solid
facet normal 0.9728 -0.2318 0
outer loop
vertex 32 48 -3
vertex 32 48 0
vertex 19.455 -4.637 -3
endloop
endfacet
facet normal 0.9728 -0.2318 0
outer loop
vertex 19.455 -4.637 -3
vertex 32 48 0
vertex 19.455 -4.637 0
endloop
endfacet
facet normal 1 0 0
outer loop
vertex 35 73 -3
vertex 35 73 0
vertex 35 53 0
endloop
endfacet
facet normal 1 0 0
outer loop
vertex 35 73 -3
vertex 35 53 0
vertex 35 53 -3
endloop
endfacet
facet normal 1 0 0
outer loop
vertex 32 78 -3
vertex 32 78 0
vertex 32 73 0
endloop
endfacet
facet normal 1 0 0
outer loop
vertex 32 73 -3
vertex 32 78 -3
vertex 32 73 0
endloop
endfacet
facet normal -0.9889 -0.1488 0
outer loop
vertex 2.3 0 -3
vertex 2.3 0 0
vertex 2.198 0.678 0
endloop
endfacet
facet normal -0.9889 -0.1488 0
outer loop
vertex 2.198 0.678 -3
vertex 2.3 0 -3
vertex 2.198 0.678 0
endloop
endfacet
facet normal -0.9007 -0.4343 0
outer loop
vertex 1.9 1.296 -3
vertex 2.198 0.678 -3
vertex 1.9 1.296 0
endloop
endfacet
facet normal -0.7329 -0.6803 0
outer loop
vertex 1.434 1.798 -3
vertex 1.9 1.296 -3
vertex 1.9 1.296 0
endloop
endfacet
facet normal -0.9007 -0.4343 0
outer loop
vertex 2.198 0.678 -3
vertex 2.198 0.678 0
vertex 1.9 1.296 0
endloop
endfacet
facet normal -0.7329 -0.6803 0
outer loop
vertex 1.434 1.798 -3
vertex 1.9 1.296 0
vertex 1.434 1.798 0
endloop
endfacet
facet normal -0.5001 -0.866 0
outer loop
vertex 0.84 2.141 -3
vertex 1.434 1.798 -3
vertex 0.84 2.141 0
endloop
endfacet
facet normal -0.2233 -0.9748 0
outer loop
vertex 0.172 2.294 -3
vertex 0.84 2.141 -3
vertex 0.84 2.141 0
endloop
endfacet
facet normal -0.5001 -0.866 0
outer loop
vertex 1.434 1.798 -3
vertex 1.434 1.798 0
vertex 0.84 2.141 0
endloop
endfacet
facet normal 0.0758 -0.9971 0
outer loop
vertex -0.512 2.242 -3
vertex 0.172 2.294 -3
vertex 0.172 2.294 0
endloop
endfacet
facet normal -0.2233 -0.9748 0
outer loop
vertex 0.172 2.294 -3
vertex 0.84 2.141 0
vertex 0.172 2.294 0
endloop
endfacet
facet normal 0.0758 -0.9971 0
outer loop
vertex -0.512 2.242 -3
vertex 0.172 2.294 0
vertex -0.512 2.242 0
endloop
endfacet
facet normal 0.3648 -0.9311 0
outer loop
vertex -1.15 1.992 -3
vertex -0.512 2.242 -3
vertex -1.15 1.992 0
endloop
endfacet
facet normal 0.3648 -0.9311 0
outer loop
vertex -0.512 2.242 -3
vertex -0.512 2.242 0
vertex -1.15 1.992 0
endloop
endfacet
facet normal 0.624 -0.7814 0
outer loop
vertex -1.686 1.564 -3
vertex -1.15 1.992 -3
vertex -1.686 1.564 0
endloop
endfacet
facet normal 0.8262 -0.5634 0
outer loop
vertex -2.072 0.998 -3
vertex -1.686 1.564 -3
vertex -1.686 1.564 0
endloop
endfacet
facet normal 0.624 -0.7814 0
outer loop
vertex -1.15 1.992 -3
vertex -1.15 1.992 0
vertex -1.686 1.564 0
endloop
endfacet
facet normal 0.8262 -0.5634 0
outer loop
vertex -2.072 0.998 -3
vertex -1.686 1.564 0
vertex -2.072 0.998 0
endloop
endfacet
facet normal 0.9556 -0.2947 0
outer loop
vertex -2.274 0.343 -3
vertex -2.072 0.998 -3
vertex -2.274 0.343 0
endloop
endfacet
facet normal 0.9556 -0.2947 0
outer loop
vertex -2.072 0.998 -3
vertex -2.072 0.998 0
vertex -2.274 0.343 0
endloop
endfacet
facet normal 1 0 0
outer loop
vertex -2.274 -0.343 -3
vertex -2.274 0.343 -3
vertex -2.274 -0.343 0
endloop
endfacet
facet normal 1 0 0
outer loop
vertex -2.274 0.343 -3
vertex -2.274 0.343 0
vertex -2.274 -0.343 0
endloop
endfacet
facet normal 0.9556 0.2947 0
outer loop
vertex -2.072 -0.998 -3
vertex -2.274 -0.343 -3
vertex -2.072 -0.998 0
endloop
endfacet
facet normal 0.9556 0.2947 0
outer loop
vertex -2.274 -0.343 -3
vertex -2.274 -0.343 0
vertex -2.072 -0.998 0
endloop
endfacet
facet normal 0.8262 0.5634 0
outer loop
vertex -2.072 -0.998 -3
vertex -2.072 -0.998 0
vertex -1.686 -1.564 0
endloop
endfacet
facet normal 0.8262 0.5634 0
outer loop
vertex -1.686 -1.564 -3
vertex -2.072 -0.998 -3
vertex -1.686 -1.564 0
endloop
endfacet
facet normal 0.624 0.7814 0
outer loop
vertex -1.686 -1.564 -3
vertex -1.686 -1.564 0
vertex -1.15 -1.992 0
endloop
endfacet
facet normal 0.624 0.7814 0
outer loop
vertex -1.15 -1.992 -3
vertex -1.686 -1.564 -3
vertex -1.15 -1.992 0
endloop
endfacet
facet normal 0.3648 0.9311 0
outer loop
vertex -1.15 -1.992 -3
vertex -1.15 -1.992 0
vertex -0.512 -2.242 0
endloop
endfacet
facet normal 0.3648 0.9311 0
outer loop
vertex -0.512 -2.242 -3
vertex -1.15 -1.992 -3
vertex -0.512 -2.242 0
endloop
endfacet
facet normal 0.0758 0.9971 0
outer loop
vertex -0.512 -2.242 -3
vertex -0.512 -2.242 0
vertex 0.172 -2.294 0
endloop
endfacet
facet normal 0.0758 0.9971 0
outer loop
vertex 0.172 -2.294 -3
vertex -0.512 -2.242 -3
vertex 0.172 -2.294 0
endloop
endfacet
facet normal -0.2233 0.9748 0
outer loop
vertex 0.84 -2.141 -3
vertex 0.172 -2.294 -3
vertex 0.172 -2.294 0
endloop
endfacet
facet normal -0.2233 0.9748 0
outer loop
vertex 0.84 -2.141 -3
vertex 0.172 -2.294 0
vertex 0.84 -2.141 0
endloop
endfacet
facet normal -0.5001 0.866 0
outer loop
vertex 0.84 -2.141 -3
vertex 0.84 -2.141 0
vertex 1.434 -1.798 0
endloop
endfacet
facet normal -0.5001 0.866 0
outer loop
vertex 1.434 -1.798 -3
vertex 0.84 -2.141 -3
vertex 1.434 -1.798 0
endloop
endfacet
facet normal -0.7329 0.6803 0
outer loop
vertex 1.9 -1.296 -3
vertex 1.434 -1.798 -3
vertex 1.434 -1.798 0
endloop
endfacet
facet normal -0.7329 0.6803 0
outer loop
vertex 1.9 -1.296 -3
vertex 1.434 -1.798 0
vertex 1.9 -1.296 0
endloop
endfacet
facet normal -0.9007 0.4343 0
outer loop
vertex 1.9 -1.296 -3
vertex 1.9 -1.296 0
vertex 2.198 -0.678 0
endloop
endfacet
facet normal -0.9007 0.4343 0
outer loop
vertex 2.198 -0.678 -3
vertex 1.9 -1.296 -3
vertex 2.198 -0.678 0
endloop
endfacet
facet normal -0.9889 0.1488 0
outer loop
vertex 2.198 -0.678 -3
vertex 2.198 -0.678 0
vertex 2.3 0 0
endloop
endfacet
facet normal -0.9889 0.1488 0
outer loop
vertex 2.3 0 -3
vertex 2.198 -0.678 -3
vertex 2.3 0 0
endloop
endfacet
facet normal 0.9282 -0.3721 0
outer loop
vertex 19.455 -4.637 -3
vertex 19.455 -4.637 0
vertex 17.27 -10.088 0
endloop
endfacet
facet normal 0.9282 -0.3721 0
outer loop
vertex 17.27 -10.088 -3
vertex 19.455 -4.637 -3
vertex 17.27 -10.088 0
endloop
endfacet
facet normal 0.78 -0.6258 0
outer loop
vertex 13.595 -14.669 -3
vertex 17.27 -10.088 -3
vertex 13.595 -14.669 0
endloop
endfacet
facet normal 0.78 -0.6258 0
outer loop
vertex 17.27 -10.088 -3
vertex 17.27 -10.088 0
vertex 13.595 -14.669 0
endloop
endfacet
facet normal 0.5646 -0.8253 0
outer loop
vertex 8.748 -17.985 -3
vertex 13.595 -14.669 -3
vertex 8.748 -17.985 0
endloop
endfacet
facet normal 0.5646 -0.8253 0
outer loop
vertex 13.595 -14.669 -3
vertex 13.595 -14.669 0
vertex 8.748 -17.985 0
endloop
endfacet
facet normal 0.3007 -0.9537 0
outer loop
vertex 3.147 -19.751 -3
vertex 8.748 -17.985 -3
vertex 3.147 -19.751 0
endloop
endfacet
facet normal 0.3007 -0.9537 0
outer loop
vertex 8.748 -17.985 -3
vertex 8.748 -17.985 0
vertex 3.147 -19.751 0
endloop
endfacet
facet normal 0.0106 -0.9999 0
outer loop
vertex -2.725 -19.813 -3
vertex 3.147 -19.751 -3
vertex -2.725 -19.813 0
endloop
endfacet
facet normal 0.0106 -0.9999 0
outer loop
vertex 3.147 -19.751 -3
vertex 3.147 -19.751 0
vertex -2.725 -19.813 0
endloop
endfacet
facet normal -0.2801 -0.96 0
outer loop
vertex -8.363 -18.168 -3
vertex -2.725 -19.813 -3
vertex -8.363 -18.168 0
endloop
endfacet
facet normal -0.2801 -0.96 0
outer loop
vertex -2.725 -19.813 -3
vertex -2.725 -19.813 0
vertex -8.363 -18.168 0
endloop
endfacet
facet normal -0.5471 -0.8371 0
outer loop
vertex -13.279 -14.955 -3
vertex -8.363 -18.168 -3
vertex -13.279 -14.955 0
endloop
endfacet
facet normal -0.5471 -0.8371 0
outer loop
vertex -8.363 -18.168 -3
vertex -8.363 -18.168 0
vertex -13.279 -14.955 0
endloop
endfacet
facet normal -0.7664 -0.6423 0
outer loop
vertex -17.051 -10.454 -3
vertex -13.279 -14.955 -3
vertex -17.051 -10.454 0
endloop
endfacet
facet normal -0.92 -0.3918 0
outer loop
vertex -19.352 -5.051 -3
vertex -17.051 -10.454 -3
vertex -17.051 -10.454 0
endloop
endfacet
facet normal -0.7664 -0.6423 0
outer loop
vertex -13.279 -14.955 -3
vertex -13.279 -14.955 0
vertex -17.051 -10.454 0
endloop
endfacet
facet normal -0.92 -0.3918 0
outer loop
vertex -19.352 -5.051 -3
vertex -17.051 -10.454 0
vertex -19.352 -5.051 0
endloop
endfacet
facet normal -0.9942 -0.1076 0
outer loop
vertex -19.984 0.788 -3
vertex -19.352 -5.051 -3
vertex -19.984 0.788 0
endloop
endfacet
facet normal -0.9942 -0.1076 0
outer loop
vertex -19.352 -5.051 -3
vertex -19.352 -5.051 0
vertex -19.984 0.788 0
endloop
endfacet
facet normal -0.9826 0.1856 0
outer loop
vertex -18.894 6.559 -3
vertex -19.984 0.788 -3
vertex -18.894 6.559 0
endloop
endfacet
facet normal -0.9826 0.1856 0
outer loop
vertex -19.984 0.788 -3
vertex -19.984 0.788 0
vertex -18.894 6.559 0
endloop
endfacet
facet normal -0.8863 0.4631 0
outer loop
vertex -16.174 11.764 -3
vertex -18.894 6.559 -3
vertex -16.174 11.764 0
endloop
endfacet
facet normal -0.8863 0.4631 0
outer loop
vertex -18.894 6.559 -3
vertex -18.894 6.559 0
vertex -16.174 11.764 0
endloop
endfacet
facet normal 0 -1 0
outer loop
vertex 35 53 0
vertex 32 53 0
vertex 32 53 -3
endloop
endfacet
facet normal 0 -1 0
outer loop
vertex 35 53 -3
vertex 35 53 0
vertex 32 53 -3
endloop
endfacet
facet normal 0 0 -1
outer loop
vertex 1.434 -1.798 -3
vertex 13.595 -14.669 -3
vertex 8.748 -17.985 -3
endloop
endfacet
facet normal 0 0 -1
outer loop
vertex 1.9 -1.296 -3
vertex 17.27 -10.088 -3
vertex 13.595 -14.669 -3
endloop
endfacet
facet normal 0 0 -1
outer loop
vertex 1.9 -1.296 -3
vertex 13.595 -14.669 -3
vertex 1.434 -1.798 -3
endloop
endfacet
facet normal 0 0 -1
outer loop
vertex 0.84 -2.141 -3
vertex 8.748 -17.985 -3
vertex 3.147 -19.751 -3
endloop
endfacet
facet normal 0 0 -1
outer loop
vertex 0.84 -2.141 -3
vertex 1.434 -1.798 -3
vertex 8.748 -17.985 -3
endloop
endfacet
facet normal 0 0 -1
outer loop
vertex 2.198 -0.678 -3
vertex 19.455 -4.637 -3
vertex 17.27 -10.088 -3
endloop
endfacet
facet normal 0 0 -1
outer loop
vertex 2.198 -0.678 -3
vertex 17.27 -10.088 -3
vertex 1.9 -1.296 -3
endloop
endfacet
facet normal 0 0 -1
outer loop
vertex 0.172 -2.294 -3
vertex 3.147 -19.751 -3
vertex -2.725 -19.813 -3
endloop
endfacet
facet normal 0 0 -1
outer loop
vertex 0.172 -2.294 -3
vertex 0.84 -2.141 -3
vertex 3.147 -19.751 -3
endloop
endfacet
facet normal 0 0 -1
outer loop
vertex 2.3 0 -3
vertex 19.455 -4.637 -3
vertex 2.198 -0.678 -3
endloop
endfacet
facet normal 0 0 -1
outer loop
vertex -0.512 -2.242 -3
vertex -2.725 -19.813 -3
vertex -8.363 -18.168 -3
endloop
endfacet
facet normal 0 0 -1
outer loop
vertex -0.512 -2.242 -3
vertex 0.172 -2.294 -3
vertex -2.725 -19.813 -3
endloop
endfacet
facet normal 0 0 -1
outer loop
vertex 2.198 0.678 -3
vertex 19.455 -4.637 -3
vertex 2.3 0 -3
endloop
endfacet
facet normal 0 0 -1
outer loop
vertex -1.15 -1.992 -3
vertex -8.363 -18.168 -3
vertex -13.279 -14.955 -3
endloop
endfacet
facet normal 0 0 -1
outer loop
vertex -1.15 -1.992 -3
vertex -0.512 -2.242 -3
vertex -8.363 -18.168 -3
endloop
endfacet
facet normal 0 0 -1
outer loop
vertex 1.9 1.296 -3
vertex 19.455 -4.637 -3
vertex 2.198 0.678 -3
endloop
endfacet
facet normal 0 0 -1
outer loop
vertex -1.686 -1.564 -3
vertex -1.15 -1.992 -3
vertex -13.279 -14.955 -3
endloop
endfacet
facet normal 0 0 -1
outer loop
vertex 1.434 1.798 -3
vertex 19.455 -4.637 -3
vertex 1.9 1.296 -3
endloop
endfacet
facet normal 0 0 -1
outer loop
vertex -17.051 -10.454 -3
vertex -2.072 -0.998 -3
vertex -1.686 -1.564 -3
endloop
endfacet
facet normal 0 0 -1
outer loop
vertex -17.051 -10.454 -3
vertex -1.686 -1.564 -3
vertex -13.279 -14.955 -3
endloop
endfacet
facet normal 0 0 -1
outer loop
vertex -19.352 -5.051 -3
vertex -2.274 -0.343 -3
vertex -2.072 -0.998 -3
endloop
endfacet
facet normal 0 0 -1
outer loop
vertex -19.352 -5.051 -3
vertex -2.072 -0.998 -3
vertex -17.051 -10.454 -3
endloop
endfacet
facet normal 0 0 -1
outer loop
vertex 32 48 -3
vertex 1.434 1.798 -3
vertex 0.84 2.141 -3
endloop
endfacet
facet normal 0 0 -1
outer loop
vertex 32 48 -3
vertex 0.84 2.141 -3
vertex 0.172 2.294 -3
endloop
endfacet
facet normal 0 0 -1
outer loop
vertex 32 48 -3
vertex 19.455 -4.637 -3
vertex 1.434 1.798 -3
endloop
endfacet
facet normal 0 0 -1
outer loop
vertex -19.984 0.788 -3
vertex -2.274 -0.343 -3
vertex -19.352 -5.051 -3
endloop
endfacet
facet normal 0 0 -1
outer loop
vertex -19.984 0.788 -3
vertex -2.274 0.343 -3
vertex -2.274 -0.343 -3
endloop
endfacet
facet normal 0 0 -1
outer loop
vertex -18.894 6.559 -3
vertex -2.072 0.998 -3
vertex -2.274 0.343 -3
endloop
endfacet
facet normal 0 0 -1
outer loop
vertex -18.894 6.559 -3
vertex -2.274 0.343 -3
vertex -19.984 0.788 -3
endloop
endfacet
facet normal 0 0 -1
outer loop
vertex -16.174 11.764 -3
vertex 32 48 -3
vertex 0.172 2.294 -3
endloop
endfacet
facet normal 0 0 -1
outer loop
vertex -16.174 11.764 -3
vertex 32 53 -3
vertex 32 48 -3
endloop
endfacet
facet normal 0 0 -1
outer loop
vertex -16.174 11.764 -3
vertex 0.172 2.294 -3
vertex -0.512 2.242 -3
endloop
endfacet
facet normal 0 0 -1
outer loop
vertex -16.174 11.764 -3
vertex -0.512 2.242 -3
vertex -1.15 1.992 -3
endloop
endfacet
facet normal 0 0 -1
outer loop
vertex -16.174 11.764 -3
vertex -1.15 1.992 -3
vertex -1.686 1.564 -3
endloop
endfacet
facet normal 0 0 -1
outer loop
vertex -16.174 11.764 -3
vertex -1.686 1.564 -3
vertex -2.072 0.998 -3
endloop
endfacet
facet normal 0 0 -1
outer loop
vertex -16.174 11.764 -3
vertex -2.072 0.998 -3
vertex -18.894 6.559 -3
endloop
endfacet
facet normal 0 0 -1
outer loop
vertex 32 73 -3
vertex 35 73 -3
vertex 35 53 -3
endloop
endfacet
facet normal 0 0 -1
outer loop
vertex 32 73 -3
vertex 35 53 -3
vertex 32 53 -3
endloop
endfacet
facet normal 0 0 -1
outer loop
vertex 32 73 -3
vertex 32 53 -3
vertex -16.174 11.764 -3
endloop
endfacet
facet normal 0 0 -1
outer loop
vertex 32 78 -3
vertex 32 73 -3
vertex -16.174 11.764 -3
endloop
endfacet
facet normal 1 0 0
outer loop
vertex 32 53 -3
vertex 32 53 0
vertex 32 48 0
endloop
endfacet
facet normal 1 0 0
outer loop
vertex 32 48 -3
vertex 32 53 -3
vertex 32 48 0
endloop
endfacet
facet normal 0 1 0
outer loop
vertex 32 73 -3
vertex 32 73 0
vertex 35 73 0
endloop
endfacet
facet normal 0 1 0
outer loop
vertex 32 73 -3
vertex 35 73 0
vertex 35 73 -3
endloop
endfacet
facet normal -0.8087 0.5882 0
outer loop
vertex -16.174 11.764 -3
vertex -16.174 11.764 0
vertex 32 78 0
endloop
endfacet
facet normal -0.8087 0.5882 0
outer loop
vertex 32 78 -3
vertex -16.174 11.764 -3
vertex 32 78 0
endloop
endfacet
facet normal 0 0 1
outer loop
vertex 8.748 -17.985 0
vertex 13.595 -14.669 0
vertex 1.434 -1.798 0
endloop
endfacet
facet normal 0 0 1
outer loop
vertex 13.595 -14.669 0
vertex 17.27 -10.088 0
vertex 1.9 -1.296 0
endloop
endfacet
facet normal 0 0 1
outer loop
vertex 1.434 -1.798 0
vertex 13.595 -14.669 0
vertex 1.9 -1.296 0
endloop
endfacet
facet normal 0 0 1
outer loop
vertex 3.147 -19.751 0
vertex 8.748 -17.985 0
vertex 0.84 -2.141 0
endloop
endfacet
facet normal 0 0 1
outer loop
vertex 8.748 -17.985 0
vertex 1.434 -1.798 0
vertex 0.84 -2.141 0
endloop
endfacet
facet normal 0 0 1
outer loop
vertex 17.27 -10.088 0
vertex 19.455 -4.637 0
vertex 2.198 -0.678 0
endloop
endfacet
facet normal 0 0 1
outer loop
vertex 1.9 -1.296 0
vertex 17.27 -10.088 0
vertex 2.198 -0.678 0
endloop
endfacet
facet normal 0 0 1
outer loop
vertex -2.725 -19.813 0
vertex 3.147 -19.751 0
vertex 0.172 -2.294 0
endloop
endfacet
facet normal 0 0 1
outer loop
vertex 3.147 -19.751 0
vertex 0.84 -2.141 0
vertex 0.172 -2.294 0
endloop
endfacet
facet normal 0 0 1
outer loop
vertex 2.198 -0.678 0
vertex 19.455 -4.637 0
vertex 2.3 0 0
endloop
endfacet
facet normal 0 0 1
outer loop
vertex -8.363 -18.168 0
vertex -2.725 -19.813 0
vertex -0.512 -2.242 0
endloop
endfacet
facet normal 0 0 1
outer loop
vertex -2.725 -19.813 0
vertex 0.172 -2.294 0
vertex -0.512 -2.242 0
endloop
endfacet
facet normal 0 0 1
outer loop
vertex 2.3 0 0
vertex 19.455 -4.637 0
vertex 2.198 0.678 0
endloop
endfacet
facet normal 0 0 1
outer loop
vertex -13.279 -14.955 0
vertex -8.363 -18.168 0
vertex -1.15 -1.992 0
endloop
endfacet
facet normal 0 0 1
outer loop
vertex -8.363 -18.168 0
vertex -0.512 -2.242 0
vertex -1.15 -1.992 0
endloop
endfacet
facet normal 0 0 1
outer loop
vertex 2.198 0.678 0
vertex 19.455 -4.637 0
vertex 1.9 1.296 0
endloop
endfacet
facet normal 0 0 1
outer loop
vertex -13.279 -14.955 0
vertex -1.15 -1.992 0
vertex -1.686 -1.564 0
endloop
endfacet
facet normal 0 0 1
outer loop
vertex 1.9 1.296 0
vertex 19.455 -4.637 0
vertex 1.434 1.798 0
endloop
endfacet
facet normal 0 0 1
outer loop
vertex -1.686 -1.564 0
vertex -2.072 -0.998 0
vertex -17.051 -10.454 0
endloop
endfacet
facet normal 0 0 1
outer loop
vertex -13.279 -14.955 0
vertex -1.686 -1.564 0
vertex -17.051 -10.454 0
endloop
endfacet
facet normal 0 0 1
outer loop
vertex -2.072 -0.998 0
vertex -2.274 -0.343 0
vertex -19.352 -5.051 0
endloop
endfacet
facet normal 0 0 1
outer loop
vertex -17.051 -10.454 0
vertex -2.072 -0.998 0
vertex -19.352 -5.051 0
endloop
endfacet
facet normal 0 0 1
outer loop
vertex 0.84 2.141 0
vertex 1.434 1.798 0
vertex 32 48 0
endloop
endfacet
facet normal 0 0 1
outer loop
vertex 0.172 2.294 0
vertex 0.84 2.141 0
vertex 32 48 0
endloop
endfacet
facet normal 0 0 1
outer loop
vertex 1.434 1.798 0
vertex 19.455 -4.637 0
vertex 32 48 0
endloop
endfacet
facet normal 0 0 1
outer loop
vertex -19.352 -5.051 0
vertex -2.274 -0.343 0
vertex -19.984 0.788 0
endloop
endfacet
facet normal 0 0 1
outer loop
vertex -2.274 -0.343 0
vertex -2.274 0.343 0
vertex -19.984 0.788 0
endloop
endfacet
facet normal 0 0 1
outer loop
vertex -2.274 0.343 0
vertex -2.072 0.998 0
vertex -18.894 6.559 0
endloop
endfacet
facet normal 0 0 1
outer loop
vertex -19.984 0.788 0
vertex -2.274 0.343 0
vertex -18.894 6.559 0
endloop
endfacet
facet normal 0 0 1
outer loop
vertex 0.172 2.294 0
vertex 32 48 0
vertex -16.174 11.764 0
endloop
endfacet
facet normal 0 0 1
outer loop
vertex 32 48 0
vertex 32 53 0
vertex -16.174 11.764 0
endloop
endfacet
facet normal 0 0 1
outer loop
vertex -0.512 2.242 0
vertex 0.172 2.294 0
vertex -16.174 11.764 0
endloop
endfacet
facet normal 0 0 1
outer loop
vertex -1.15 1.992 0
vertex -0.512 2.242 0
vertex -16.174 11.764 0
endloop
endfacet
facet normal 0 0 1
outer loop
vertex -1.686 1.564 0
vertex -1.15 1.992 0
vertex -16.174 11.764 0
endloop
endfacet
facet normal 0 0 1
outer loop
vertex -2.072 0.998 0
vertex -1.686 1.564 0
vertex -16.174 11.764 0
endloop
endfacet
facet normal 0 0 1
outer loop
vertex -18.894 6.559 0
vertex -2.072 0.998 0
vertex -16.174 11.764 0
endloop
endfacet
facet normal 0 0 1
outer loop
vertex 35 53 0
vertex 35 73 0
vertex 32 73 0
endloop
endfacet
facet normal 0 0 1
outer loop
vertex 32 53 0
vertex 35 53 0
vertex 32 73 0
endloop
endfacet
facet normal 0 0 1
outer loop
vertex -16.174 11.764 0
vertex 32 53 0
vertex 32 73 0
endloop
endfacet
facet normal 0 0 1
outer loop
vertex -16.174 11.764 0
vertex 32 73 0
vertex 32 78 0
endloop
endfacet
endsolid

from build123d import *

# Parameters (mm, degrees)
BOSS_EXTRUDE1_DEPTH = 3
SKETCH2_R           = 2.3
CUT_EXTRUDE1_DEPTH  = 10
SKETCH4_W           = 3
SKETCH4_H           = 20
BOSS_EXTRUDE3_DEPTH = 3


with BuildPart() as part:
    # Sketch1 → Boss-Extrude1 (new body)
    with BuildSketch(Plane.XY):
        with BuildLine():
            Line((-16.174411119, 11.763860972), (32, 78))
            Line((32, 78), (32, 48))
            Line((32, 48), (19.455095298, -4.636730199))
            ThreePointArc((19.455095298, -4.636730199), (-8.362748941, -18.167675419), (-16.174411119, 11.763860972))
        make_face()
    extrude(amount=-BOSS_EXTRUDE1_DEPTH)

    # Sketch2 → Cut-Extrude1 (cut)
    with BuildSketch(Plane.XY):
        Circle(SKETCH2_R)
    extrude(amount=-CUT_EXTRUDE1_DEPTH, mode=Mode.SUBTRACT)

    # Sketch4 → Boss-Extrude3 (add)
    with BuildSketch(Plane(origin=(32, 0, 0), x_dir=(0, 0, -1), z_dir=(1, 0, 0))):
        with Locations((1.5, 63)):
            Rectangle(SKETCH4_W, SKETCH4_H)
    extrude(amount=BOSS_EXTRUDE3_DEPTH)


solid = part.part
